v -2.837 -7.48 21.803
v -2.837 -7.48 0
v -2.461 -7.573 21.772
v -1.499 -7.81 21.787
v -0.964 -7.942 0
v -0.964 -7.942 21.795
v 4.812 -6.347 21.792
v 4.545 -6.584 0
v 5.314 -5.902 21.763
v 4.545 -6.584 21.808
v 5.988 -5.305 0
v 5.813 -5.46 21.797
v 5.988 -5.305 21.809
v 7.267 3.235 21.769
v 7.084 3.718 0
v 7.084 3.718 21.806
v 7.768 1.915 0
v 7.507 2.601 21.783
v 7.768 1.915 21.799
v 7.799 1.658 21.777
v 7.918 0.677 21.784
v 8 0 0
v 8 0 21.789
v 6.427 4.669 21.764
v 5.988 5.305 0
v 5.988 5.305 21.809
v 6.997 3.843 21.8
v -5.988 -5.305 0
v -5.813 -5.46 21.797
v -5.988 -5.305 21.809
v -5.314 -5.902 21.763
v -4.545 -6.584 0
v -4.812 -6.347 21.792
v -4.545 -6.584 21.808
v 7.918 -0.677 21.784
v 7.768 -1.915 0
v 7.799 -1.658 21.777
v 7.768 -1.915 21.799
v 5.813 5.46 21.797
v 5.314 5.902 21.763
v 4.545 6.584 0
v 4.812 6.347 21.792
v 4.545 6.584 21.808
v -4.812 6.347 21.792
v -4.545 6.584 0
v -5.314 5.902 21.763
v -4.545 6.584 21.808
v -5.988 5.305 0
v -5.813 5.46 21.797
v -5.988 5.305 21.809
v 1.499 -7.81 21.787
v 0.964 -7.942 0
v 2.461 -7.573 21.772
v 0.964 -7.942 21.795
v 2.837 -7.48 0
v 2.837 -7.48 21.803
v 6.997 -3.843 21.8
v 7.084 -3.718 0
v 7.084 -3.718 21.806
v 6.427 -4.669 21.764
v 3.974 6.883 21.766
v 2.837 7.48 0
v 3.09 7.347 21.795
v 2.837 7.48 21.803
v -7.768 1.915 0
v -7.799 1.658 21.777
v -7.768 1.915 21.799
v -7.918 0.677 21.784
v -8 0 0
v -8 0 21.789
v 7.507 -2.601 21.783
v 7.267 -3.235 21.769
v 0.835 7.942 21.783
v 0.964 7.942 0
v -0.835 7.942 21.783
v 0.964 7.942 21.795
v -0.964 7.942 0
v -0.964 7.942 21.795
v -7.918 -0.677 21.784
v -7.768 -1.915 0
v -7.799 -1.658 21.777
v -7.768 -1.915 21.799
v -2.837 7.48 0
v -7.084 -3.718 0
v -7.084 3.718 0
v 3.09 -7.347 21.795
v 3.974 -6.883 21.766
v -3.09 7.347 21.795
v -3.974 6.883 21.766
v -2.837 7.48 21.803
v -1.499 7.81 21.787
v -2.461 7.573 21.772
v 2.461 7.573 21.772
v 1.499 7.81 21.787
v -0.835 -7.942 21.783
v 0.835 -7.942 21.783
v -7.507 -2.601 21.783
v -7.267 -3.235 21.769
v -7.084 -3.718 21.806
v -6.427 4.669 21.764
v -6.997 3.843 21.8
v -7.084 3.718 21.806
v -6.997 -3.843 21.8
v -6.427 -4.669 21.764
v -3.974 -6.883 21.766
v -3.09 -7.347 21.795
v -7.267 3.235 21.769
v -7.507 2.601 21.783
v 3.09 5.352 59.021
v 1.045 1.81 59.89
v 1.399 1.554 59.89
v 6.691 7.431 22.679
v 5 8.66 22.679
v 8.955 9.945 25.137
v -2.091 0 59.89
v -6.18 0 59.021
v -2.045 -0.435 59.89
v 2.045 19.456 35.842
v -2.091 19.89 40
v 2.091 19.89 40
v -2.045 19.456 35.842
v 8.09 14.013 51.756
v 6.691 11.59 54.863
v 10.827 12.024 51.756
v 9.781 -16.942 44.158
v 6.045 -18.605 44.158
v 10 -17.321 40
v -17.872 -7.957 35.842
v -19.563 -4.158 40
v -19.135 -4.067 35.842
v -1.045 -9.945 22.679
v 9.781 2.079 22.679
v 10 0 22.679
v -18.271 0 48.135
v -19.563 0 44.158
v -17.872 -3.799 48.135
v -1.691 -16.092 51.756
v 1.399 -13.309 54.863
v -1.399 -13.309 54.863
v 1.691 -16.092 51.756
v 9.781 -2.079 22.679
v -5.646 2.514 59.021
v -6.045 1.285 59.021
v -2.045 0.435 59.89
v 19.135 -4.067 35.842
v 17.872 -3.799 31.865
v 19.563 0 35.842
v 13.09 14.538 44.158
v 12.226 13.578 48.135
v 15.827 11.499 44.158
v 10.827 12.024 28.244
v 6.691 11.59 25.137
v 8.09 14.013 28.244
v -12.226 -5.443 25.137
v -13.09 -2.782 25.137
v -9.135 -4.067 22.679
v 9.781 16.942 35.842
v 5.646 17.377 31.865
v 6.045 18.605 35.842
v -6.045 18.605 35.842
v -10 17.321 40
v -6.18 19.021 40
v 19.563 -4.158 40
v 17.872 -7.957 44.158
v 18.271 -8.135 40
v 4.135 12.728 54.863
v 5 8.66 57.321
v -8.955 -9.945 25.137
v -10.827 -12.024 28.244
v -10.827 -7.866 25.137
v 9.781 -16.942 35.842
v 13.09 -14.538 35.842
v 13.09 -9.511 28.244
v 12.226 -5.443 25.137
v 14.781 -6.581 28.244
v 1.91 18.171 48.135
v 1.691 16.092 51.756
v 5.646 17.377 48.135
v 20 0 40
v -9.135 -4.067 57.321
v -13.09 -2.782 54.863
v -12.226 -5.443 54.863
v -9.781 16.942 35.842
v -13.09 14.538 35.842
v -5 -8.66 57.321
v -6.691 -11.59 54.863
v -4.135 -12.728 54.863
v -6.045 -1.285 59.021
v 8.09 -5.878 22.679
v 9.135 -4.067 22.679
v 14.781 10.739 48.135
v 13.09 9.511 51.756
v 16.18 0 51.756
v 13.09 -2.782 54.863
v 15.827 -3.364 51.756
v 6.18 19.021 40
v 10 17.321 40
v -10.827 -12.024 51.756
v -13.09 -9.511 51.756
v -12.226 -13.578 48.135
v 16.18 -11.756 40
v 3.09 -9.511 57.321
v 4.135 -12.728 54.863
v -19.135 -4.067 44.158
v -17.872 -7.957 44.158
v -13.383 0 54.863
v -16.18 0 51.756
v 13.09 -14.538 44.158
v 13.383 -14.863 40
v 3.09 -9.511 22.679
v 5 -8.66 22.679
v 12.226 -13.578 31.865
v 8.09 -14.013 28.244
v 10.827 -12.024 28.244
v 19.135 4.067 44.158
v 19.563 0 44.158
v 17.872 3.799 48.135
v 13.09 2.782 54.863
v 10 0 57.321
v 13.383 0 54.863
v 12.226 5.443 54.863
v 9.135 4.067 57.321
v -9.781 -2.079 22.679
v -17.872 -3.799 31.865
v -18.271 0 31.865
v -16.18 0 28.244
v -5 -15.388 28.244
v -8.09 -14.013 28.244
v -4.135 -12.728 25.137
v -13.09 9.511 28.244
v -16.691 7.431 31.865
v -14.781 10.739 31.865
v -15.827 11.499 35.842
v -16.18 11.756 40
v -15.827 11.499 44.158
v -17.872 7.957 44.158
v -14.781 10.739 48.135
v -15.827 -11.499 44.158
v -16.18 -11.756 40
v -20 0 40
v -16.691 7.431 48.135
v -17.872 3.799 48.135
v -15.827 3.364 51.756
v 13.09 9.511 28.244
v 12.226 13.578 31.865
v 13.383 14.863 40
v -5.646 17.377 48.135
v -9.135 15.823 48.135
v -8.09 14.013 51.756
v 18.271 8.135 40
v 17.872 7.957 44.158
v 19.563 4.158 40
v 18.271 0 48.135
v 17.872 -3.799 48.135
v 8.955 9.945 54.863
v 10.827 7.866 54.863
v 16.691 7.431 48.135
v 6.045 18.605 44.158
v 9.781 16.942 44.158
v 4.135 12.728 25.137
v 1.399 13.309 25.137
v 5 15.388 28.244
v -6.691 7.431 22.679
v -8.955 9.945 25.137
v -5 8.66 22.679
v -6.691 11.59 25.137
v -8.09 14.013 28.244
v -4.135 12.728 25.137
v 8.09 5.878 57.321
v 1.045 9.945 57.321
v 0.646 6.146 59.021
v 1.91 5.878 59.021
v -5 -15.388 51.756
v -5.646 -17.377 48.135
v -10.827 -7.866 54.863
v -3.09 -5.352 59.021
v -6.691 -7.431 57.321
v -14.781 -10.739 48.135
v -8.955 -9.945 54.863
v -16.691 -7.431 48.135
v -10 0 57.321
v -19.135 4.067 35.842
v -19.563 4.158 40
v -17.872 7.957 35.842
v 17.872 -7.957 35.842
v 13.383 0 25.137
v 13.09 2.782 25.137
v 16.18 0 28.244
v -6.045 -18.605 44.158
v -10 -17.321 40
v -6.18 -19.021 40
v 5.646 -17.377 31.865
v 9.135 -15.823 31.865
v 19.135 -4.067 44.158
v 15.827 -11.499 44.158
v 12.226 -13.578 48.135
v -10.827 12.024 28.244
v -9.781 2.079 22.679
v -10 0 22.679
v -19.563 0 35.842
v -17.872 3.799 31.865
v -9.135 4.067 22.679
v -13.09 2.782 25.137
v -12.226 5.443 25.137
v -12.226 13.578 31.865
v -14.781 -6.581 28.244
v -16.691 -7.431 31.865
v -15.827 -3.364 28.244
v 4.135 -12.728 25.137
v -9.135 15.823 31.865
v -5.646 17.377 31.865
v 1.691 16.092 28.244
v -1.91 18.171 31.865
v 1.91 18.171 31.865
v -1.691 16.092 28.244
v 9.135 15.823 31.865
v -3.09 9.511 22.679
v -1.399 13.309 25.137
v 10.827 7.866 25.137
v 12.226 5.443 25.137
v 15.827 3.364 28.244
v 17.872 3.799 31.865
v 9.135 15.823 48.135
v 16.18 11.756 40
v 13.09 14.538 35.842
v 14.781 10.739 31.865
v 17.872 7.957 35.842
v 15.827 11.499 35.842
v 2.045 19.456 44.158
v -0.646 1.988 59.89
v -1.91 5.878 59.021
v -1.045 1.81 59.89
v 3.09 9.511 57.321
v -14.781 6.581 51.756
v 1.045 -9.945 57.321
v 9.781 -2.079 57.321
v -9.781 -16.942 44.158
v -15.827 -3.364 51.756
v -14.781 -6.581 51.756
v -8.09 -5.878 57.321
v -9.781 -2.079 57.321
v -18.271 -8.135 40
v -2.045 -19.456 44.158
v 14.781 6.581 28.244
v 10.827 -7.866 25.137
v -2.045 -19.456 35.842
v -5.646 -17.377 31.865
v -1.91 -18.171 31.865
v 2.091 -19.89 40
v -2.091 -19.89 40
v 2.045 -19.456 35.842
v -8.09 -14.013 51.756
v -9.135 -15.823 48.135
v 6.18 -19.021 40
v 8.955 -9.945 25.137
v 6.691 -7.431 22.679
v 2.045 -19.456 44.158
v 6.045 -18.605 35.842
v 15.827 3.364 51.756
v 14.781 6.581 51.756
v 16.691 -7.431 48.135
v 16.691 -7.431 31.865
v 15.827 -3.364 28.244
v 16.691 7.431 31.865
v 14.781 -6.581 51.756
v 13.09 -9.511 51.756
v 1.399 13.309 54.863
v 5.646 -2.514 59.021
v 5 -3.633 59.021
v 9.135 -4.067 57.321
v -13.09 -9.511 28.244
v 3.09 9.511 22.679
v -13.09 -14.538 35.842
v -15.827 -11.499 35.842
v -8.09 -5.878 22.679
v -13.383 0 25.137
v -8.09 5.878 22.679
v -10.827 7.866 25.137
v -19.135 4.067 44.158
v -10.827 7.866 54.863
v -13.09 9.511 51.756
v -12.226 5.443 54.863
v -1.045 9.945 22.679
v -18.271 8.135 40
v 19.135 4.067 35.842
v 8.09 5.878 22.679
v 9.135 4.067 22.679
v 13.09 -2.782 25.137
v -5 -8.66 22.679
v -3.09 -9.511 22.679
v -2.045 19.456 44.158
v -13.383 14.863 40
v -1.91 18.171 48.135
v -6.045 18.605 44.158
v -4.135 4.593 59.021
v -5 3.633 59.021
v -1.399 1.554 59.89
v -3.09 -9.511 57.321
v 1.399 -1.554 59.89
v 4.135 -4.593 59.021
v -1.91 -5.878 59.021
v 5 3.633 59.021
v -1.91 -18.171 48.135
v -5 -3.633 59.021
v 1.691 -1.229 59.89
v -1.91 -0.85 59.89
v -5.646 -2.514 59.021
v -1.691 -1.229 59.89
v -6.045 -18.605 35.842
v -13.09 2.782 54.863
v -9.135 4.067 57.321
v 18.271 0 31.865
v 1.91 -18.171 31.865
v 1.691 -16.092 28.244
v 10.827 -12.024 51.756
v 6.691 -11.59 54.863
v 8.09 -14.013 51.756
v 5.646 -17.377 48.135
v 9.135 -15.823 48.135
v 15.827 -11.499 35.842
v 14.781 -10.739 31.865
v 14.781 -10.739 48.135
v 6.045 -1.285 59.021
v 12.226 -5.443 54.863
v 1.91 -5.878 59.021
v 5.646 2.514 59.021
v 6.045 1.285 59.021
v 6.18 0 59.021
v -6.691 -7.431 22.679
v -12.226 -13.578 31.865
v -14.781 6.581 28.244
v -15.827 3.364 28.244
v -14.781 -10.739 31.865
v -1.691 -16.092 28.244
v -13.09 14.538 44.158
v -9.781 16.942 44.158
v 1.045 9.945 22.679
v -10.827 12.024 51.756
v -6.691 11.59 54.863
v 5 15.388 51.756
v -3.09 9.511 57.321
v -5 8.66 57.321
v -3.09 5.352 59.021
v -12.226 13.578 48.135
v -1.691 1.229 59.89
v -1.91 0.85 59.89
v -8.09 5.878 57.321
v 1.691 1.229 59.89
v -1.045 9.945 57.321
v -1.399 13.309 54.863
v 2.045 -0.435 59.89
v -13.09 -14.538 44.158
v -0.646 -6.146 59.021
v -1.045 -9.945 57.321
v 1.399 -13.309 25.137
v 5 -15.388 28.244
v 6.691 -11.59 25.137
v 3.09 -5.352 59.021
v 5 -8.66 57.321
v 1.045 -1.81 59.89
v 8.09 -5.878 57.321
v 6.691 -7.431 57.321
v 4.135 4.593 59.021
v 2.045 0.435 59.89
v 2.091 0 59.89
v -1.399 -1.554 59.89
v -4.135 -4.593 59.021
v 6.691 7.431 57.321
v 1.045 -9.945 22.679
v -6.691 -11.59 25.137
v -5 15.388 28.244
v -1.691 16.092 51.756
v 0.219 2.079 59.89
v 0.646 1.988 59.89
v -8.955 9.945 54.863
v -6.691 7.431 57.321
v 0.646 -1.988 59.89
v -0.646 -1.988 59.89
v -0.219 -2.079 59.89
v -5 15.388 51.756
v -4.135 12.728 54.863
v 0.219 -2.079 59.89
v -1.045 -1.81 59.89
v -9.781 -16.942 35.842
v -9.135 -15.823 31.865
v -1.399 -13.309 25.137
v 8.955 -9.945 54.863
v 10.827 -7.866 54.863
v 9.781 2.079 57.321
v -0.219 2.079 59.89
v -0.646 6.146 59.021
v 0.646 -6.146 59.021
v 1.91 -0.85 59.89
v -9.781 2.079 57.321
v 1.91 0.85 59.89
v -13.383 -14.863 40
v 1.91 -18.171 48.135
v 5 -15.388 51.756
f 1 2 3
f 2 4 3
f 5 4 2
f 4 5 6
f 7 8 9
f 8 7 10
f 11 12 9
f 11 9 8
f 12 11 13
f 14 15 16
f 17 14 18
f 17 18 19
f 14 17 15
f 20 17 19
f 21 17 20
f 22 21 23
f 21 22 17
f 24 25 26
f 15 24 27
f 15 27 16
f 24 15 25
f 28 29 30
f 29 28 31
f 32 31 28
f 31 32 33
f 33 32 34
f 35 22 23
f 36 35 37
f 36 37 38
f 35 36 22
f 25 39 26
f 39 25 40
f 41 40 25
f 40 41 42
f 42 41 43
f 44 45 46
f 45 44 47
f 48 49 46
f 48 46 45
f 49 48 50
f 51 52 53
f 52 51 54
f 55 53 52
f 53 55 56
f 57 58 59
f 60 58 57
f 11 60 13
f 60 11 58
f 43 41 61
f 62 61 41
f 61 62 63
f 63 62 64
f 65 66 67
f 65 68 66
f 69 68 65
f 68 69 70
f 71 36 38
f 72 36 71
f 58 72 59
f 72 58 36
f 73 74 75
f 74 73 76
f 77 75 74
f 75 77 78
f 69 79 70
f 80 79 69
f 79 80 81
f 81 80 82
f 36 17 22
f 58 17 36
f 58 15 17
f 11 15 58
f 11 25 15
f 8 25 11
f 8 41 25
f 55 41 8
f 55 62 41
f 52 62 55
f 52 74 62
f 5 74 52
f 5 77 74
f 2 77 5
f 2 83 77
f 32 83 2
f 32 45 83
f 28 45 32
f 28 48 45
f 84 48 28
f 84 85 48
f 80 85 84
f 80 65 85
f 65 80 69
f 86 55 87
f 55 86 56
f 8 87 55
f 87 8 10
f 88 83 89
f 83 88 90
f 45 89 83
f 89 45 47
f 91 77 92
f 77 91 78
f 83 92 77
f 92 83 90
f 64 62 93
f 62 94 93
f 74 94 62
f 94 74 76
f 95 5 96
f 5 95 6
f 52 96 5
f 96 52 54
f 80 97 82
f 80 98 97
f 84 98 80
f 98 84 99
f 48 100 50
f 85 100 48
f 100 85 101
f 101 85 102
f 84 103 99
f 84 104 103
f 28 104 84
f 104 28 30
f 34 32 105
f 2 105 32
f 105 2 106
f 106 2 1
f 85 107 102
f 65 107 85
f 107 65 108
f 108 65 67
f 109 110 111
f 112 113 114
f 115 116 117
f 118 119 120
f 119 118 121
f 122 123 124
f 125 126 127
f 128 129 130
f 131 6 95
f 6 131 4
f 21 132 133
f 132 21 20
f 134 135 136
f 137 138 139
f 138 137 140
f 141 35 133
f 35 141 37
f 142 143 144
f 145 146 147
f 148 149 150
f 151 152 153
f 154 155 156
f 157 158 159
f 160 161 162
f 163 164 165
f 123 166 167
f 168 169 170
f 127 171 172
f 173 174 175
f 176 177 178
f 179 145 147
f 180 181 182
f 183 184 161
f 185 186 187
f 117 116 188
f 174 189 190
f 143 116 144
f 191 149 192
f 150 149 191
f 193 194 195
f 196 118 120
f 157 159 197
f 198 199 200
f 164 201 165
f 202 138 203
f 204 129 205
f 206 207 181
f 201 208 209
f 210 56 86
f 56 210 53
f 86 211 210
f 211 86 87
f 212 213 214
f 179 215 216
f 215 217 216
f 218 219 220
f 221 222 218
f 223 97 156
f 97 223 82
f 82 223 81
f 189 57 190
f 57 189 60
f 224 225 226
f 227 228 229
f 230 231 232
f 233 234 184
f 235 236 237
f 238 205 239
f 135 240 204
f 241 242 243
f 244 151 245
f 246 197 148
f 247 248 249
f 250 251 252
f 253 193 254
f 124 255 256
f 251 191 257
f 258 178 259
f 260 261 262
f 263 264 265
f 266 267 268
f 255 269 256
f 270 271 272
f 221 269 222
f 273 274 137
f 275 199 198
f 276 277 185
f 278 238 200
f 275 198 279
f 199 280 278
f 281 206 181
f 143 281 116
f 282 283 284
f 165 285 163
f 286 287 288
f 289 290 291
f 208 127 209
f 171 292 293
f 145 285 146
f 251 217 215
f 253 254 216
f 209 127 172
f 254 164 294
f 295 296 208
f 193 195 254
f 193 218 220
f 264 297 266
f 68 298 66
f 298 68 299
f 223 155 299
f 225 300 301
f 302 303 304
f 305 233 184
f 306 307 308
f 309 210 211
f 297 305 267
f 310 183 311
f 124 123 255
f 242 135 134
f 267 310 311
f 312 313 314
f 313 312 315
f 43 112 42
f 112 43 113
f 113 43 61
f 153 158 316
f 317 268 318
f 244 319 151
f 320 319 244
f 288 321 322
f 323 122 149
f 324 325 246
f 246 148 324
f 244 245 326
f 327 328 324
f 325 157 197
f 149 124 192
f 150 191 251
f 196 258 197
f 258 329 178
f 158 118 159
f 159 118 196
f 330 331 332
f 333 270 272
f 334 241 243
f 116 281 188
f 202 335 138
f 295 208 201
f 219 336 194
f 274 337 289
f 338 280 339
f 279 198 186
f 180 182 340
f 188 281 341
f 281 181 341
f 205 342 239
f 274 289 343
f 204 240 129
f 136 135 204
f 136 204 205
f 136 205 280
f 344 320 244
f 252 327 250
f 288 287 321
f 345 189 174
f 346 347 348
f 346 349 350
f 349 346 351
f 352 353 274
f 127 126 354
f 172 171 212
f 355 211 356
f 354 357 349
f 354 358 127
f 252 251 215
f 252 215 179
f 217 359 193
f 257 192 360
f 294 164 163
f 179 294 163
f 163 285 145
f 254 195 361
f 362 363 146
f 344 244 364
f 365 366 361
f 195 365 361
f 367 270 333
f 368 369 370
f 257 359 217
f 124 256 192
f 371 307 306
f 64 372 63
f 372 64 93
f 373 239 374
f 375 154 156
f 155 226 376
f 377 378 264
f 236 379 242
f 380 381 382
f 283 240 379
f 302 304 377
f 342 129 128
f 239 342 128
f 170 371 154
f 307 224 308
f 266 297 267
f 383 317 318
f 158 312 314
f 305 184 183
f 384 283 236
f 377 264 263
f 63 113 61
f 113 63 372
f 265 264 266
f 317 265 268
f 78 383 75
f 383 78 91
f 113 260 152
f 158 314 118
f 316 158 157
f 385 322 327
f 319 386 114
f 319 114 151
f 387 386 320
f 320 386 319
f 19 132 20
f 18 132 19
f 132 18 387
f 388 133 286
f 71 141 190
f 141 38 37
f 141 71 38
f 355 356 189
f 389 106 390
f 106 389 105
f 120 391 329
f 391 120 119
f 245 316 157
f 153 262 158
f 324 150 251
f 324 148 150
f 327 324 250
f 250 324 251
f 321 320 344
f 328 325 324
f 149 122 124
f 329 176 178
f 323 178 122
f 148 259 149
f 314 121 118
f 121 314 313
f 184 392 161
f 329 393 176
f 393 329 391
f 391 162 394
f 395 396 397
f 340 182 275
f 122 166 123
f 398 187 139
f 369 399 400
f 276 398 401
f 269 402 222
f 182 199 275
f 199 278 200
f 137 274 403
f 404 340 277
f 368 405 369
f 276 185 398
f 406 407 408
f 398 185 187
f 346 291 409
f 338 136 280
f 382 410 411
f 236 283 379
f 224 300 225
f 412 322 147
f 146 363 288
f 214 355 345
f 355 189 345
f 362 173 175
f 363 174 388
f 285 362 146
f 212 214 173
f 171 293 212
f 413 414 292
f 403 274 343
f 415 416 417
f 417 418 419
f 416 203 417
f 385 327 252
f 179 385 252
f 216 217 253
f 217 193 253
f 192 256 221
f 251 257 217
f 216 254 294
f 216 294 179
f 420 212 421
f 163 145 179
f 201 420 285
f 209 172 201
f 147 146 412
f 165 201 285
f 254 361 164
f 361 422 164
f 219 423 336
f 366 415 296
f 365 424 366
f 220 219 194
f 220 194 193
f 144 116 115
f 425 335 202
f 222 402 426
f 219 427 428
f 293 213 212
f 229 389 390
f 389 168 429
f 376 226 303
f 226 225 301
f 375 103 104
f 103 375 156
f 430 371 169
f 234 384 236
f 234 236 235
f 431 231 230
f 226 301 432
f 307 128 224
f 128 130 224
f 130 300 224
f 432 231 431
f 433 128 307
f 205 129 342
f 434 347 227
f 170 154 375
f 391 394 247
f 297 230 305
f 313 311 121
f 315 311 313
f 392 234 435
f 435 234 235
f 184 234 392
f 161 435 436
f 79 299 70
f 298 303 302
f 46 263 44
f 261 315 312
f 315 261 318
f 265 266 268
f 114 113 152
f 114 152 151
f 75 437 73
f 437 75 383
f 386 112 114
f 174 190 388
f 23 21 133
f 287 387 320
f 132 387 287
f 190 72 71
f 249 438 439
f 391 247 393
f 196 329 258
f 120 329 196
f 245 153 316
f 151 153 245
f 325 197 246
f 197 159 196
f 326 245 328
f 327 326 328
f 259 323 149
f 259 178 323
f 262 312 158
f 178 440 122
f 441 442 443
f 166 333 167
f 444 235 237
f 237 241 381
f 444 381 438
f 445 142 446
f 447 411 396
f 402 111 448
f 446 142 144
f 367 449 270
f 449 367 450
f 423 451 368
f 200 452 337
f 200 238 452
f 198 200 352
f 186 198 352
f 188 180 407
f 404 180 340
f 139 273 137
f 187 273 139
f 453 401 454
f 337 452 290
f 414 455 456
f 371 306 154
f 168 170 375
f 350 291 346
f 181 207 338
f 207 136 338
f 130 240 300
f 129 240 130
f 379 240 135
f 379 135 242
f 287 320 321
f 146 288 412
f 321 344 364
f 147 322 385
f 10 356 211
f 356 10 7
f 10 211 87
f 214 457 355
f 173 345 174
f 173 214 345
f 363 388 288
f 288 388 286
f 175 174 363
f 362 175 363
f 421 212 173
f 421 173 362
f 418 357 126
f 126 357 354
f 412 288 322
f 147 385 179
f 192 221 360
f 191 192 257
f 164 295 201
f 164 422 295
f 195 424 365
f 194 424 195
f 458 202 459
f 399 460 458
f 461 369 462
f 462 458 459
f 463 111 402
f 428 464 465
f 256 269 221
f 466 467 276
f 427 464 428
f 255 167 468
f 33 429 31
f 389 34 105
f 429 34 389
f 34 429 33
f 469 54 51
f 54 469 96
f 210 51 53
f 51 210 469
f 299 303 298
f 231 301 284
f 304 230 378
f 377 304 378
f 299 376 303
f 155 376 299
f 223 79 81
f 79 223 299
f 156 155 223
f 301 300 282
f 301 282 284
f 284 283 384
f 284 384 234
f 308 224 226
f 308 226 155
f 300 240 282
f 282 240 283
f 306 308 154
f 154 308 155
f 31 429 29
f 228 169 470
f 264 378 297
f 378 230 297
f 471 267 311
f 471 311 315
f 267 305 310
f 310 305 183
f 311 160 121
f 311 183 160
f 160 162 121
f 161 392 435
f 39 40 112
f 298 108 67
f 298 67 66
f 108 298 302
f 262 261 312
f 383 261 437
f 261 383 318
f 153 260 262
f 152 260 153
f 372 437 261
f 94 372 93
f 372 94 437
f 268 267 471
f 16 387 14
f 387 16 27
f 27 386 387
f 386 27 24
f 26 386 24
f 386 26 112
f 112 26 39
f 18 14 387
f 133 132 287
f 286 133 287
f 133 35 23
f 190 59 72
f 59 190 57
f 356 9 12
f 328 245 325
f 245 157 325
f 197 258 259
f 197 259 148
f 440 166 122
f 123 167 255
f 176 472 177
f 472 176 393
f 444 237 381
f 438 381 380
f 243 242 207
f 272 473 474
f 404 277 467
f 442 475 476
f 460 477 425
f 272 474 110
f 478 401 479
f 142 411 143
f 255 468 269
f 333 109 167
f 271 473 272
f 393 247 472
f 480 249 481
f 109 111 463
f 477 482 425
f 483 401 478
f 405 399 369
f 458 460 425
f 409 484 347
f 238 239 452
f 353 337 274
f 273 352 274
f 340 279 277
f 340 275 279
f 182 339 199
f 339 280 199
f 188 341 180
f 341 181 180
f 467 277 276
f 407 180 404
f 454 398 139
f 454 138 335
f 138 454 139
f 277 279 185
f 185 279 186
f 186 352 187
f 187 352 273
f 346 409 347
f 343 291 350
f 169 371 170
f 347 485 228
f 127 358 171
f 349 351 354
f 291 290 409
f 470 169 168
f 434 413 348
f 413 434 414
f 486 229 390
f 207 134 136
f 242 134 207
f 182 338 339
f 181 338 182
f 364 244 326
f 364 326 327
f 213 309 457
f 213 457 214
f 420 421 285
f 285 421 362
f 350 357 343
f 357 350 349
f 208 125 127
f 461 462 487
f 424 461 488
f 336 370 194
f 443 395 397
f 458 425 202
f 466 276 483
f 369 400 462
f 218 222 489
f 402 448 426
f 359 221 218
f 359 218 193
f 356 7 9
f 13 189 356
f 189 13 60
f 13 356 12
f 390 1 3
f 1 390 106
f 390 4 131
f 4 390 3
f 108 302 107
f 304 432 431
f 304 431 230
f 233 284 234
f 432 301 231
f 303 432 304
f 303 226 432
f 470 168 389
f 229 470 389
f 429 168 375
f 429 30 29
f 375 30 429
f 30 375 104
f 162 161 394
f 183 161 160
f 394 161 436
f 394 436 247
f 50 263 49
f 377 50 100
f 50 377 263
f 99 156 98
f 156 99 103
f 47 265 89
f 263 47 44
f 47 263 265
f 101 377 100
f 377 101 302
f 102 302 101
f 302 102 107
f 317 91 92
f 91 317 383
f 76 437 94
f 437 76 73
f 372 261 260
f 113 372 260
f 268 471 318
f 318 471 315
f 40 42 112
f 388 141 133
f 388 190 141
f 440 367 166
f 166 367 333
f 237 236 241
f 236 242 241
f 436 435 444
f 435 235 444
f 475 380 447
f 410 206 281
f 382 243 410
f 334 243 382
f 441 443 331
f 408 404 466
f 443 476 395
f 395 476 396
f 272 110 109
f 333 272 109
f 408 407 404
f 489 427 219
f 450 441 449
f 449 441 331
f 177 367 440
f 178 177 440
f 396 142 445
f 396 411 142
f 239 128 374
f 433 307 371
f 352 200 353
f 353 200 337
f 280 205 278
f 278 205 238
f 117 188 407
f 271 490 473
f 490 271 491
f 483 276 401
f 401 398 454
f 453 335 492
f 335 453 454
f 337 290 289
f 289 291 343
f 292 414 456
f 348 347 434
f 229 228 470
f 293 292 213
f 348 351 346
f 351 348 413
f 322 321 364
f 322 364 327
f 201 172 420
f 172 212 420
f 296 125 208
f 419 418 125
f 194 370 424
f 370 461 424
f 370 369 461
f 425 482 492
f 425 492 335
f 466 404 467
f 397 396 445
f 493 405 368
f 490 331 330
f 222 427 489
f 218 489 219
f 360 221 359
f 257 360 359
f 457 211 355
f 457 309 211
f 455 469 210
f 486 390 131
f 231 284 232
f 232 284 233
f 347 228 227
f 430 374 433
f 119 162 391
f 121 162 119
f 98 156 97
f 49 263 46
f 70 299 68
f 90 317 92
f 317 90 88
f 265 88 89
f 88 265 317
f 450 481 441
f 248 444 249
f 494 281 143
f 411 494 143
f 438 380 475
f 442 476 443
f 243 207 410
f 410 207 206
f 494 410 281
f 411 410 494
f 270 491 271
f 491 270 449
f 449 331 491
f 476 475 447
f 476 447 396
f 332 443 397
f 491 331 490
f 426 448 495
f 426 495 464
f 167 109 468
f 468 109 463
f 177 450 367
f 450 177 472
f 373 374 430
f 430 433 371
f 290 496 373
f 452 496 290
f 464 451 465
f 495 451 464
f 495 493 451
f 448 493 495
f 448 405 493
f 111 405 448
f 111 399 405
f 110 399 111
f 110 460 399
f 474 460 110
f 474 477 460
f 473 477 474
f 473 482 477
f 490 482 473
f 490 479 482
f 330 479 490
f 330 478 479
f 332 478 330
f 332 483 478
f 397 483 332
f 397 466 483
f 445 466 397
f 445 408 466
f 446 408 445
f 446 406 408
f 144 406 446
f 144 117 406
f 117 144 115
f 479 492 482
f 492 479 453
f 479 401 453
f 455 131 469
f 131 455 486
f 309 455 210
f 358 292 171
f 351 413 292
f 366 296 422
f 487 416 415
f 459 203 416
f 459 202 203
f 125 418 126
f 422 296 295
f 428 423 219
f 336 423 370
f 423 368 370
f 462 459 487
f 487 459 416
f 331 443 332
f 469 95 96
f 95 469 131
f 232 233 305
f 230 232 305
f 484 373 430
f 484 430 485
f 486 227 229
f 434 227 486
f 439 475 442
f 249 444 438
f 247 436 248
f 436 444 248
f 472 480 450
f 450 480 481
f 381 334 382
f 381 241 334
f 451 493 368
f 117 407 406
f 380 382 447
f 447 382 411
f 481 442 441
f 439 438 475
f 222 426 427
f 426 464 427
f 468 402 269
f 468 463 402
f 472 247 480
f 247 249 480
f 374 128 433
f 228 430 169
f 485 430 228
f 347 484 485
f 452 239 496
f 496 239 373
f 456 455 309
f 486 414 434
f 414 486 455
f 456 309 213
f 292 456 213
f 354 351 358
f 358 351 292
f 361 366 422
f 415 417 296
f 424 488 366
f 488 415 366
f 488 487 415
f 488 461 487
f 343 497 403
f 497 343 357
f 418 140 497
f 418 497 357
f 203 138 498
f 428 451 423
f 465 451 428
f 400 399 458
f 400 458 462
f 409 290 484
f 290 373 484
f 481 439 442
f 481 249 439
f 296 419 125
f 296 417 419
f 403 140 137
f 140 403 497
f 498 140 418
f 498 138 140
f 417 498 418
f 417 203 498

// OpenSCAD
// Classic OpenSCAD tree — works with openscad_rs
union() {
    cylinder(h = 30, r = 8);
    translate([0, 0, 40]) sphere(20);
}
